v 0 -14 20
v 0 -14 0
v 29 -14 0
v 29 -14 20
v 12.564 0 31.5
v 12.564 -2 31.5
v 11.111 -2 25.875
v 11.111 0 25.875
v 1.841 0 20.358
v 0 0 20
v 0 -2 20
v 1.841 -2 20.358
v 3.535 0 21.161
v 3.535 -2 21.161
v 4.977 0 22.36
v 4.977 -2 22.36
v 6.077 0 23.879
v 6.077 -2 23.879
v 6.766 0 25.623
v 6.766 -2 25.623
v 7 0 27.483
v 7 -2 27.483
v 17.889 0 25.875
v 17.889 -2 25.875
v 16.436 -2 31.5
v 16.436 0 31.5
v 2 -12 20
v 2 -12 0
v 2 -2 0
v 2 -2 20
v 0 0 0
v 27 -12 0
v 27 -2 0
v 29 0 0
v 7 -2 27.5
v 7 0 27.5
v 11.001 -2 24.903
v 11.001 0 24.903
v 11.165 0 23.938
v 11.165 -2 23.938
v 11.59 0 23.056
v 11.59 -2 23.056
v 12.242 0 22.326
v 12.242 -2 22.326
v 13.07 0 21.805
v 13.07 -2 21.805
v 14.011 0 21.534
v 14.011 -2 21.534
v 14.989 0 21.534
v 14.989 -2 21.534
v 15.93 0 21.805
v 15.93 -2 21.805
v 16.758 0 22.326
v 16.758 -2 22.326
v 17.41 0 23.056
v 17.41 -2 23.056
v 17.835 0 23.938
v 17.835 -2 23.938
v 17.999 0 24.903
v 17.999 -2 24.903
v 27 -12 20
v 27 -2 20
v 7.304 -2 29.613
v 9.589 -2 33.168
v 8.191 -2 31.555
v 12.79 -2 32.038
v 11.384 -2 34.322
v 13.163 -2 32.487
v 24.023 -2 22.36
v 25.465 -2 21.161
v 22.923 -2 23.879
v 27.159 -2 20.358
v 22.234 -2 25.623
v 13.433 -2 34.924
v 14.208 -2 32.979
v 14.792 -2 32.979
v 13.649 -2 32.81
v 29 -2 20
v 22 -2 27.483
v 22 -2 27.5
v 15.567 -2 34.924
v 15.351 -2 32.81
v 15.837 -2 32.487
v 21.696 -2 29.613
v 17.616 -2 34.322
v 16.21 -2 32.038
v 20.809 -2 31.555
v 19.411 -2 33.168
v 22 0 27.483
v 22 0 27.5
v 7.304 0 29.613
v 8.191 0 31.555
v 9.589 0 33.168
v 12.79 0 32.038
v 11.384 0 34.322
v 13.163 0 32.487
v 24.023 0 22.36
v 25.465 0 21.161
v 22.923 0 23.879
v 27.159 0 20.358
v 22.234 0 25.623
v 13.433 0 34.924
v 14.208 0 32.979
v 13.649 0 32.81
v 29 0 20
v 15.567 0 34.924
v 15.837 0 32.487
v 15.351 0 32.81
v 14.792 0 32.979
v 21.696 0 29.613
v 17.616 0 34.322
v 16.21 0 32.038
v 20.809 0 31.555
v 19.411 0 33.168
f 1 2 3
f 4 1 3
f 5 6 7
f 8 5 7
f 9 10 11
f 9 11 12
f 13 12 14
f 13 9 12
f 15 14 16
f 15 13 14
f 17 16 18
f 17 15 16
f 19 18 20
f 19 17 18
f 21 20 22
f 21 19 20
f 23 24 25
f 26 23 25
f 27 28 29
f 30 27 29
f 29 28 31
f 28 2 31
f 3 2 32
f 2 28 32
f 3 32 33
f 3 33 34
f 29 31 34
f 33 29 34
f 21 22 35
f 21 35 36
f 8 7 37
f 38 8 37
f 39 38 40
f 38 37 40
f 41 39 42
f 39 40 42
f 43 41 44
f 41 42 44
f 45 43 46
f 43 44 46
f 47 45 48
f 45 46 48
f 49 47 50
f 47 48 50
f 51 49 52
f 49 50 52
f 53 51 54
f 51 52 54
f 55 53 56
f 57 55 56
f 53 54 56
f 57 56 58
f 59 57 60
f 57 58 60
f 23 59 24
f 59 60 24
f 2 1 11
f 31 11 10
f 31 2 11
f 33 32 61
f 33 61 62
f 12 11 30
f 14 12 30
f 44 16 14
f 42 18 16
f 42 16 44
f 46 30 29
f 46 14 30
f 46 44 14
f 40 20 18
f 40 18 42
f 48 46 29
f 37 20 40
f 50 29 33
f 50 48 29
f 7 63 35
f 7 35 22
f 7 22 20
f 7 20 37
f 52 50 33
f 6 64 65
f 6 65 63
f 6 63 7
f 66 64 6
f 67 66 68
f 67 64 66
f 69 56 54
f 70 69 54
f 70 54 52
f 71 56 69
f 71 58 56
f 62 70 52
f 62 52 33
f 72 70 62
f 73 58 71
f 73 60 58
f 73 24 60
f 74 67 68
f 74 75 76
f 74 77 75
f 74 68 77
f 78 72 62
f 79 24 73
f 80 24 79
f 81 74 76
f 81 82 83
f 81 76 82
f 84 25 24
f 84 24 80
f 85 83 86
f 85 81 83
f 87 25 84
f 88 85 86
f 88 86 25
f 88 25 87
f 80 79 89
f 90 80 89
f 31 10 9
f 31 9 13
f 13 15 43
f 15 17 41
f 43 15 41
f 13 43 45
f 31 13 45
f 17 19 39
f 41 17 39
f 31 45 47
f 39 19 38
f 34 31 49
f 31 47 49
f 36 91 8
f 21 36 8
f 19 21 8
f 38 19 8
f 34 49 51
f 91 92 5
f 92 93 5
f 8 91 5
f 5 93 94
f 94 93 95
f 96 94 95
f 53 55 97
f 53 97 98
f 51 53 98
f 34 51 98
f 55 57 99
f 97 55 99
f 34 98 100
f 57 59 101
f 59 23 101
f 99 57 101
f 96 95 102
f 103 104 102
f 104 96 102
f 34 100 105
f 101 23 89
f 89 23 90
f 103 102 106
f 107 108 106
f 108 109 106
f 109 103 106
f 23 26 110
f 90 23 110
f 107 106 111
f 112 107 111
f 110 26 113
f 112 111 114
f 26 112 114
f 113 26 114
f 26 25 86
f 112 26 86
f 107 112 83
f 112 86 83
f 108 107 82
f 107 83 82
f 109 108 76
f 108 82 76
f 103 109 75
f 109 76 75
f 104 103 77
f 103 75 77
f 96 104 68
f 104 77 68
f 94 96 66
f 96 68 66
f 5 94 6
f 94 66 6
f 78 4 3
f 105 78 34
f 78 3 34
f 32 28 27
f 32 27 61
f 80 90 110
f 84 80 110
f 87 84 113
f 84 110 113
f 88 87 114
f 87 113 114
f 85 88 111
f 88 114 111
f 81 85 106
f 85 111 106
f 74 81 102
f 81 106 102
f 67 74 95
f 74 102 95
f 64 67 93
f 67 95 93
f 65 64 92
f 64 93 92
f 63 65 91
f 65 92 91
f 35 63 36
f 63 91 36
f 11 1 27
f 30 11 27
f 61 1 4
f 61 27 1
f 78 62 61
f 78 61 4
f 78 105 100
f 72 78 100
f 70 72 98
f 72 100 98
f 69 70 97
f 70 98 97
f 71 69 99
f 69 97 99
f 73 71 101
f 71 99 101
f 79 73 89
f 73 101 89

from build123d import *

# Parameters (mm, degrees)
F0_W        = 29
F0_H        = 14
F0_W_2      = 25
F0_H_2      = 10
F1_DEPTH    = 20
F2_W        = 15
F2_H        = 2
F3_DEPTH    = 15
F5_DEPTH    = 2
F6_T1_DEPTH = 2
F6_T3_DEPTH = 2
F6_T5_DEPTH = 39.5
F6_T7_DEPTH = 39.5


# Not quite as in the source:
# - a fillet or chamfer that OpenCascade refuses, or shapes differently, is made with other operations: its cross-section is extruded or revolved along the edge and cut away or added


with BuildPart() as f1:
    # F0 (on Top) → F1 (new body)
    with BuildSketch(Plane.XY):
        with Locations((14.5, -7)):
            Rectangle(F0_W, F0_H)
        with Locations((14.5, -7)):
            Rectangle(F0_W_2, F0_H_2, mode=Mode.SUBTRACT)
    extrude(amount=F1_DEPTH)

    # F2 (on face) → F3 (join)
    with BuildSketch(Plane.XY.offset(20)):
        with Locations((14.5, -1)):
            Rectangle(F2_W, F2_H)
    extrude(amount=F3_DEPTH)

    # F4 (on face) → F5 (cut, through all)
    with BuildSketch(Plane.XZ.offset(2)):
        with BuildLine():
            Line((17.8888604279, 25.875), (16.4364916731, 31.5))
            ThreePointArc((16.4364916731, 31.5), (14.5, 33), (12.5635083269, 31.5))
            Line((12.5635083269, 31.5), (11.1111395721, 25.875))
            ThreePointArc((11.1111395721, 25.875), (14.5, 21.5), (17.8888604279, 25.875))
        make_face()
    extrude(amount=-F5_DEPTH, mode=Mode.SUBTRACT)

    # F6: fillet of radius 7.5 on 4 edges, made by hand

    # F6_s2 → F6_t1 (join)
    with BuildSketch(Plane.XZ):
        with BuildLine():
            ThreePointArc((0, 20), (4.9772255751, 22.3598393906), (7, 27.4833147735))
            Line((7, 27.4833147735), (7, 20))
            Line((7, 20), (0, 20))
        make_face()
    extrude(amount=F6_T1_DEPTH)

    # F6_s4 → F6_t3 (join)
    with BuildSketch(Plane.XZ):
        with BuildLine():
            ThreePointArc((29, 20), (24.0227744249, 22.3598393906), (22, 27.4833147735))
            Line((22, 27.4833147735), (22, 20))
            Line((22, 20), (29, 20))
        make_face()
    extrude(amount=F6_T3_DEPTH)

    # F6_s6 → F6_t5 (cut)
    with BuildSketch(Plane.XZ.offset(-18.75)):
        with BuildLine():
            ThreePointArc((22, 27.5), (19.8033008589, 32.8033008589), (14.5, 35))
            Line((14.5, 35), (22, 35))
            Line((22, 35), (22, 27.5))
        make_face()
    extrude(amount=F6_T5_DEPTH, mode=Mode.SUBTRACT)

    # F6_s8 → F6_t7 (cut)
    with BuildSketch(Plane.XZ.offset(-18.75)):
        with BuildLine():
            ThreePointArc((7, 27.5), (9.1966991411, 32.8033008589), (14.5, 35))
            Line((14.5, 35), (7, 35))
            Line((7, 35), (7, 27.5))
        make_face()
    extrude(amount=F6_T7_DEPTH, mode=Mode.SUBTRACT)


solid = f1.part
